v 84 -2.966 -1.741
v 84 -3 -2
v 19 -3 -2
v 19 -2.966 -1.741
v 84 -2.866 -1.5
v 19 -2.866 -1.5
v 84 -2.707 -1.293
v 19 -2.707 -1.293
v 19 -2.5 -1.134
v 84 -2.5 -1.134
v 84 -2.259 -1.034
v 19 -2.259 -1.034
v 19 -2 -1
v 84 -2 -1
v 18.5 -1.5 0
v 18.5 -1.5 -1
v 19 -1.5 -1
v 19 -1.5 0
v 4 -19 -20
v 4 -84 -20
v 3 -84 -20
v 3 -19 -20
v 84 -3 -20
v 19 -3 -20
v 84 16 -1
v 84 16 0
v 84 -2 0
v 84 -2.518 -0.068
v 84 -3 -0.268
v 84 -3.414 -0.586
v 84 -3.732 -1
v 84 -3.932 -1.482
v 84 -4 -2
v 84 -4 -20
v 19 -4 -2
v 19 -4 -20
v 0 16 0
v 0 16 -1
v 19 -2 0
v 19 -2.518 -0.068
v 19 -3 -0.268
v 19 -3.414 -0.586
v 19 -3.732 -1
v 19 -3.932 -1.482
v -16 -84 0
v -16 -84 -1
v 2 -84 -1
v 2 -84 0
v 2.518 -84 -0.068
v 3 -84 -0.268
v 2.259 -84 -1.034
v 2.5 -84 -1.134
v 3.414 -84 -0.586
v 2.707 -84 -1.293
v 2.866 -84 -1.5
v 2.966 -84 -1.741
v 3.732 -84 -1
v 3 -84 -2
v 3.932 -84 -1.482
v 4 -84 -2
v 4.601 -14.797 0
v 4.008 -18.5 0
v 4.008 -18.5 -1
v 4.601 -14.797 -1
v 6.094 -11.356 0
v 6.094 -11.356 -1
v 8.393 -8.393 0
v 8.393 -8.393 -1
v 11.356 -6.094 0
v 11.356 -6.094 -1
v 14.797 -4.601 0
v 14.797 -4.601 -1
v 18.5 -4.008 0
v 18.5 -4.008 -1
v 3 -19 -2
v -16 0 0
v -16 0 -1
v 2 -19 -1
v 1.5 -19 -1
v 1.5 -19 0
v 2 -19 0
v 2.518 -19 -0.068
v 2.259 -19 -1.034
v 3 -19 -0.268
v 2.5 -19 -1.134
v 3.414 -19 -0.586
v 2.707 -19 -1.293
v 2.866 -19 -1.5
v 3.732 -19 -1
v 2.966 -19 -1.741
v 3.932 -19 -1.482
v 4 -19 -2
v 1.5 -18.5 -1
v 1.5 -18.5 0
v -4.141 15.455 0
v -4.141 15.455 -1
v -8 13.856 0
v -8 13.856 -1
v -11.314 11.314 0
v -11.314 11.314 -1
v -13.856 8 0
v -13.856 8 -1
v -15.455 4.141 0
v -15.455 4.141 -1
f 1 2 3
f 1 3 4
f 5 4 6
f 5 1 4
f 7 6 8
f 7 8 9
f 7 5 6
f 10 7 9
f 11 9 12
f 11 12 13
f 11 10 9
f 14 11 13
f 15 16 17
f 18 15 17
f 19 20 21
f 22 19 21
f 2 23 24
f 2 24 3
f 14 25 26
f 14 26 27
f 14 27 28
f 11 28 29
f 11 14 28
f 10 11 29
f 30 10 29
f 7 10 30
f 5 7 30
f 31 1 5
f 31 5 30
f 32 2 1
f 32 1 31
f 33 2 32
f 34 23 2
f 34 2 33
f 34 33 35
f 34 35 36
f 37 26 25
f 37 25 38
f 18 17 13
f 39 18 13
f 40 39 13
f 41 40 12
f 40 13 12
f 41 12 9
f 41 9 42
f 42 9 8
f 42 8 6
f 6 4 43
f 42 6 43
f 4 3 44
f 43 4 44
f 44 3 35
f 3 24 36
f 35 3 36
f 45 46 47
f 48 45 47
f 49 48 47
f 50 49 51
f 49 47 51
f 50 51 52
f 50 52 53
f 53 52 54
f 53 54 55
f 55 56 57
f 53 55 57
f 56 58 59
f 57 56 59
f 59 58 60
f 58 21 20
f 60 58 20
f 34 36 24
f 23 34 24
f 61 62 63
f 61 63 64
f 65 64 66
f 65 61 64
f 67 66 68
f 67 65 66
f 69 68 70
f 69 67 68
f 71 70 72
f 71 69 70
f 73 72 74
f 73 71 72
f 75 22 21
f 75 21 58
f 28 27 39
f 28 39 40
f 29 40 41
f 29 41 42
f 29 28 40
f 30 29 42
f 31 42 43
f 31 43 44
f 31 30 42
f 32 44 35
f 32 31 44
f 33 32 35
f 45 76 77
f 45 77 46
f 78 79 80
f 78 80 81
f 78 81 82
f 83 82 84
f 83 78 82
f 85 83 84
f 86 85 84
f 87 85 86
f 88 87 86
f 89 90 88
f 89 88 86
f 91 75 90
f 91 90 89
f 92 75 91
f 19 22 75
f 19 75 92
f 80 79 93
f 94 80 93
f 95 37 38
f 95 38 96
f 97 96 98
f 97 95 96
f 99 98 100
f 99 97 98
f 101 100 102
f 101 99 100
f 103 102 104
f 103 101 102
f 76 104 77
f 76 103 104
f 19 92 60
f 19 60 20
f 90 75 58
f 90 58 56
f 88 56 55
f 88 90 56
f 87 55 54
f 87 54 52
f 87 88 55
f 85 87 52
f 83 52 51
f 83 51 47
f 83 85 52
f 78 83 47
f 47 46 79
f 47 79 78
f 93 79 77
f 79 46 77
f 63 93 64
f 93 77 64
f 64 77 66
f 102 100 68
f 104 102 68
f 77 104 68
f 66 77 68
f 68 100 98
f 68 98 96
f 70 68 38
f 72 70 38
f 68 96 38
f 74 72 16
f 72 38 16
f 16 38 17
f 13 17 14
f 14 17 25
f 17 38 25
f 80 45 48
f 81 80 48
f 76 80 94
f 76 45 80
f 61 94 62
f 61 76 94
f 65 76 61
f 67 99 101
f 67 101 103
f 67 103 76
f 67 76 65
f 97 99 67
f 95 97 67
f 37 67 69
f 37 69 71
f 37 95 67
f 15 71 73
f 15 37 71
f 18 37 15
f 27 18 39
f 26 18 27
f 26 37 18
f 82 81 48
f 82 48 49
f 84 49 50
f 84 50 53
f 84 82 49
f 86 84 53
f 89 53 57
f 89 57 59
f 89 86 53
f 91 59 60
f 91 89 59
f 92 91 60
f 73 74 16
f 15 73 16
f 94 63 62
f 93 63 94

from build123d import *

# Parameters (mm, degrees)
BASE_FLANGE1_DEPTH              = 1
EDGE_FLANGE1_STRIP_W            = 6
EDGE_FLANGE1_STRIP_H            = 1
EDGE_FLANGE1_STRIP_CUT_DEPTH    = 65
EDGE_FLANGE1_RELIEF_W           = 6.5
EDGE_FLANGE1_RELIEF_H           = 0.5
EDGE_FLANGE1_RELIEF_CUT_DEPTH   = 1
EDGE_FLANGE1_STRIP_2_W          = 6
EDGE_FLANGE1_STRIP_2_H          = 1
EDGE_FLANGE1_STRIP_CUT_2_DEPTH  = 65
EDGE_FLANGE1_RELIEF_2_W         = 6.5
EDGE_FLANGE1_RELIEF_2_H         = 0.5
EDGE_FLANGE1_RELIEF_CUT_2_DEPTH = 1
EDGE_FLANGE1_DEPTH              = 65
EDGE_FLANGE1_BEND_DEPTH         = 65


# Sheet-metal steps are written as plain solids
with BuildPart() as part:
    # Sketch1 → Base-Flange1 (new body)
    with BuildSketch(Plane.XY):
        with BuildLine():
            Line((-16, 0), (-16, -84))
            Line((-16, -84), (4, -84))
            Line((4, -84), (4, -19))
            ThreePointArc((4, -19), (8.393398282, -8.393398282), (19, -4))
            Line((19, -4), (84, -4))
            Line((84, -4), (84, 16))
            Line((84, 16), (0, 16))
            ThreePointArc((0, 16), (-11.313708499, 11.313708499), (-16, 0))
        make_face()
    extrude(amount=-BASE_FLANGE1_DEPTH)

    # Edge-Flange1 strip (across the edge) → Edge-Flange1 strip cut (cut)
    with BuildSketch(Plane(origin=(84, -4, -1), x_dir=(0, 1, 0), z_dir=(-1, 0, 0))):
        with Locations((-1, -0.5)):
            Rectangle(EDGE_FLANGE1_STRIP_W, EDGE_FLANGE1_STRIP_H)
    extrude(amount=EDGE_FLANGE1_STRIP_CUT_DEPTH, mode=Mode.SUBTRACT)

    # Edge-Flange1 relief (on the sheet) → Edge-Flange1 relief cut (cut)
    with BuildSketch(Plane(origin=(84, -2, -1), x_dir=(0, 1, 0), z_dir=(0, 0, -1))):
        with Locations((-2.75, -65.25)):
            Rectangle(EDGE_FLANGE1_RELIEF_W, EDGE_FLANGE1_RELIEF_H)
    extrude(amount=-EDGE_FLANGE1_RELIEF_CUT_DEPTH, mode=Mode.SUBTRACT)

    # Edge-Flange1 strip 2 (across the edge) → Edge-Flange1 strip cut 2 (cut)
    with BuildSketch(Plane(origin=(4, -19, -1), x_dir=(-1, 0, 0), z_dir=(0, -1, 0))):
        with Locations((-1, -0.5)):
            Rectangle(EDGE_FLANGE1_STRIP_2_W, EDGE_FLANGE1_STRIP_2_H)
    extrude(amount=EDGE_FLANGE1_STRIP_CUT_2_DEPTH, mode=Mode.SUBTRACT)

    # Edge-Flange1 relief 2 (on the sheet) → Edge-Flange1 relief cut 2 (cut)
    with BuildSketch(Plane(origin=(2, -19, -1), x_dir=(-1, 0, 0), z_dir=(0, 0, -1))):
        with Locations((-2.75, 0.25)):
            Rectangle(EDGE_FLANGE1_RELIEF_2_W, EDGE_FLANGE1_RELIEF_2_H)
    extrude(amount=-EDGE_FLANGE1_RELIEF_CUT_2_DEPTH, mode=Mode.SUBTRACT)

    # Edge-Flange1 section (across the edge) → Edge-Flange1 (add)
    with BuildSketch(Plane(origin=(84, -4, -1), x_dir=(0, 1, 0), z_dir=(-1, 0, 0))):
        with BuildLine():
            Line((0, 1), (0, 19))
            Line((0, 19), (1, 19))
            Line((1, 19), (1, 1))
            ThreePointArc((1, 1), (1.292893219, 0.292893219), (2, 0))
            Line((2, 0), (2, -1))
            ThreePointArc((2, -1), (0.585786438, -0.414213562), (0, 1))
        make_face()
    extrude(amount=EDGE_FLANGE1_DEPTH)

    # Edge-Flange1 section 2 (across the edge) → Edge-Flange1 bend (add)
    with BuildSketch(Plane(origin=(4, -19, -1), x_dir=(-1, 0, 0), z_dir=(0, -1, 0))):
        with BuildLine():
            Line((0, 1), (0, 19))
            Line((0, 19), (1, 19))
            Line((1, 19), (1, 1))
            ThreePointArc((1, 1), (1.292893219, 0.292893219), (2, 0))
            Line((2, 0), (2, -1))
            ThreePointArc((2, -1), (0.585786438, -0.414213562), (0, 1))
        make_face()
    extrude(amount=EDGE_FLANGE1_BEND_DEPTH)


solid = part.part
